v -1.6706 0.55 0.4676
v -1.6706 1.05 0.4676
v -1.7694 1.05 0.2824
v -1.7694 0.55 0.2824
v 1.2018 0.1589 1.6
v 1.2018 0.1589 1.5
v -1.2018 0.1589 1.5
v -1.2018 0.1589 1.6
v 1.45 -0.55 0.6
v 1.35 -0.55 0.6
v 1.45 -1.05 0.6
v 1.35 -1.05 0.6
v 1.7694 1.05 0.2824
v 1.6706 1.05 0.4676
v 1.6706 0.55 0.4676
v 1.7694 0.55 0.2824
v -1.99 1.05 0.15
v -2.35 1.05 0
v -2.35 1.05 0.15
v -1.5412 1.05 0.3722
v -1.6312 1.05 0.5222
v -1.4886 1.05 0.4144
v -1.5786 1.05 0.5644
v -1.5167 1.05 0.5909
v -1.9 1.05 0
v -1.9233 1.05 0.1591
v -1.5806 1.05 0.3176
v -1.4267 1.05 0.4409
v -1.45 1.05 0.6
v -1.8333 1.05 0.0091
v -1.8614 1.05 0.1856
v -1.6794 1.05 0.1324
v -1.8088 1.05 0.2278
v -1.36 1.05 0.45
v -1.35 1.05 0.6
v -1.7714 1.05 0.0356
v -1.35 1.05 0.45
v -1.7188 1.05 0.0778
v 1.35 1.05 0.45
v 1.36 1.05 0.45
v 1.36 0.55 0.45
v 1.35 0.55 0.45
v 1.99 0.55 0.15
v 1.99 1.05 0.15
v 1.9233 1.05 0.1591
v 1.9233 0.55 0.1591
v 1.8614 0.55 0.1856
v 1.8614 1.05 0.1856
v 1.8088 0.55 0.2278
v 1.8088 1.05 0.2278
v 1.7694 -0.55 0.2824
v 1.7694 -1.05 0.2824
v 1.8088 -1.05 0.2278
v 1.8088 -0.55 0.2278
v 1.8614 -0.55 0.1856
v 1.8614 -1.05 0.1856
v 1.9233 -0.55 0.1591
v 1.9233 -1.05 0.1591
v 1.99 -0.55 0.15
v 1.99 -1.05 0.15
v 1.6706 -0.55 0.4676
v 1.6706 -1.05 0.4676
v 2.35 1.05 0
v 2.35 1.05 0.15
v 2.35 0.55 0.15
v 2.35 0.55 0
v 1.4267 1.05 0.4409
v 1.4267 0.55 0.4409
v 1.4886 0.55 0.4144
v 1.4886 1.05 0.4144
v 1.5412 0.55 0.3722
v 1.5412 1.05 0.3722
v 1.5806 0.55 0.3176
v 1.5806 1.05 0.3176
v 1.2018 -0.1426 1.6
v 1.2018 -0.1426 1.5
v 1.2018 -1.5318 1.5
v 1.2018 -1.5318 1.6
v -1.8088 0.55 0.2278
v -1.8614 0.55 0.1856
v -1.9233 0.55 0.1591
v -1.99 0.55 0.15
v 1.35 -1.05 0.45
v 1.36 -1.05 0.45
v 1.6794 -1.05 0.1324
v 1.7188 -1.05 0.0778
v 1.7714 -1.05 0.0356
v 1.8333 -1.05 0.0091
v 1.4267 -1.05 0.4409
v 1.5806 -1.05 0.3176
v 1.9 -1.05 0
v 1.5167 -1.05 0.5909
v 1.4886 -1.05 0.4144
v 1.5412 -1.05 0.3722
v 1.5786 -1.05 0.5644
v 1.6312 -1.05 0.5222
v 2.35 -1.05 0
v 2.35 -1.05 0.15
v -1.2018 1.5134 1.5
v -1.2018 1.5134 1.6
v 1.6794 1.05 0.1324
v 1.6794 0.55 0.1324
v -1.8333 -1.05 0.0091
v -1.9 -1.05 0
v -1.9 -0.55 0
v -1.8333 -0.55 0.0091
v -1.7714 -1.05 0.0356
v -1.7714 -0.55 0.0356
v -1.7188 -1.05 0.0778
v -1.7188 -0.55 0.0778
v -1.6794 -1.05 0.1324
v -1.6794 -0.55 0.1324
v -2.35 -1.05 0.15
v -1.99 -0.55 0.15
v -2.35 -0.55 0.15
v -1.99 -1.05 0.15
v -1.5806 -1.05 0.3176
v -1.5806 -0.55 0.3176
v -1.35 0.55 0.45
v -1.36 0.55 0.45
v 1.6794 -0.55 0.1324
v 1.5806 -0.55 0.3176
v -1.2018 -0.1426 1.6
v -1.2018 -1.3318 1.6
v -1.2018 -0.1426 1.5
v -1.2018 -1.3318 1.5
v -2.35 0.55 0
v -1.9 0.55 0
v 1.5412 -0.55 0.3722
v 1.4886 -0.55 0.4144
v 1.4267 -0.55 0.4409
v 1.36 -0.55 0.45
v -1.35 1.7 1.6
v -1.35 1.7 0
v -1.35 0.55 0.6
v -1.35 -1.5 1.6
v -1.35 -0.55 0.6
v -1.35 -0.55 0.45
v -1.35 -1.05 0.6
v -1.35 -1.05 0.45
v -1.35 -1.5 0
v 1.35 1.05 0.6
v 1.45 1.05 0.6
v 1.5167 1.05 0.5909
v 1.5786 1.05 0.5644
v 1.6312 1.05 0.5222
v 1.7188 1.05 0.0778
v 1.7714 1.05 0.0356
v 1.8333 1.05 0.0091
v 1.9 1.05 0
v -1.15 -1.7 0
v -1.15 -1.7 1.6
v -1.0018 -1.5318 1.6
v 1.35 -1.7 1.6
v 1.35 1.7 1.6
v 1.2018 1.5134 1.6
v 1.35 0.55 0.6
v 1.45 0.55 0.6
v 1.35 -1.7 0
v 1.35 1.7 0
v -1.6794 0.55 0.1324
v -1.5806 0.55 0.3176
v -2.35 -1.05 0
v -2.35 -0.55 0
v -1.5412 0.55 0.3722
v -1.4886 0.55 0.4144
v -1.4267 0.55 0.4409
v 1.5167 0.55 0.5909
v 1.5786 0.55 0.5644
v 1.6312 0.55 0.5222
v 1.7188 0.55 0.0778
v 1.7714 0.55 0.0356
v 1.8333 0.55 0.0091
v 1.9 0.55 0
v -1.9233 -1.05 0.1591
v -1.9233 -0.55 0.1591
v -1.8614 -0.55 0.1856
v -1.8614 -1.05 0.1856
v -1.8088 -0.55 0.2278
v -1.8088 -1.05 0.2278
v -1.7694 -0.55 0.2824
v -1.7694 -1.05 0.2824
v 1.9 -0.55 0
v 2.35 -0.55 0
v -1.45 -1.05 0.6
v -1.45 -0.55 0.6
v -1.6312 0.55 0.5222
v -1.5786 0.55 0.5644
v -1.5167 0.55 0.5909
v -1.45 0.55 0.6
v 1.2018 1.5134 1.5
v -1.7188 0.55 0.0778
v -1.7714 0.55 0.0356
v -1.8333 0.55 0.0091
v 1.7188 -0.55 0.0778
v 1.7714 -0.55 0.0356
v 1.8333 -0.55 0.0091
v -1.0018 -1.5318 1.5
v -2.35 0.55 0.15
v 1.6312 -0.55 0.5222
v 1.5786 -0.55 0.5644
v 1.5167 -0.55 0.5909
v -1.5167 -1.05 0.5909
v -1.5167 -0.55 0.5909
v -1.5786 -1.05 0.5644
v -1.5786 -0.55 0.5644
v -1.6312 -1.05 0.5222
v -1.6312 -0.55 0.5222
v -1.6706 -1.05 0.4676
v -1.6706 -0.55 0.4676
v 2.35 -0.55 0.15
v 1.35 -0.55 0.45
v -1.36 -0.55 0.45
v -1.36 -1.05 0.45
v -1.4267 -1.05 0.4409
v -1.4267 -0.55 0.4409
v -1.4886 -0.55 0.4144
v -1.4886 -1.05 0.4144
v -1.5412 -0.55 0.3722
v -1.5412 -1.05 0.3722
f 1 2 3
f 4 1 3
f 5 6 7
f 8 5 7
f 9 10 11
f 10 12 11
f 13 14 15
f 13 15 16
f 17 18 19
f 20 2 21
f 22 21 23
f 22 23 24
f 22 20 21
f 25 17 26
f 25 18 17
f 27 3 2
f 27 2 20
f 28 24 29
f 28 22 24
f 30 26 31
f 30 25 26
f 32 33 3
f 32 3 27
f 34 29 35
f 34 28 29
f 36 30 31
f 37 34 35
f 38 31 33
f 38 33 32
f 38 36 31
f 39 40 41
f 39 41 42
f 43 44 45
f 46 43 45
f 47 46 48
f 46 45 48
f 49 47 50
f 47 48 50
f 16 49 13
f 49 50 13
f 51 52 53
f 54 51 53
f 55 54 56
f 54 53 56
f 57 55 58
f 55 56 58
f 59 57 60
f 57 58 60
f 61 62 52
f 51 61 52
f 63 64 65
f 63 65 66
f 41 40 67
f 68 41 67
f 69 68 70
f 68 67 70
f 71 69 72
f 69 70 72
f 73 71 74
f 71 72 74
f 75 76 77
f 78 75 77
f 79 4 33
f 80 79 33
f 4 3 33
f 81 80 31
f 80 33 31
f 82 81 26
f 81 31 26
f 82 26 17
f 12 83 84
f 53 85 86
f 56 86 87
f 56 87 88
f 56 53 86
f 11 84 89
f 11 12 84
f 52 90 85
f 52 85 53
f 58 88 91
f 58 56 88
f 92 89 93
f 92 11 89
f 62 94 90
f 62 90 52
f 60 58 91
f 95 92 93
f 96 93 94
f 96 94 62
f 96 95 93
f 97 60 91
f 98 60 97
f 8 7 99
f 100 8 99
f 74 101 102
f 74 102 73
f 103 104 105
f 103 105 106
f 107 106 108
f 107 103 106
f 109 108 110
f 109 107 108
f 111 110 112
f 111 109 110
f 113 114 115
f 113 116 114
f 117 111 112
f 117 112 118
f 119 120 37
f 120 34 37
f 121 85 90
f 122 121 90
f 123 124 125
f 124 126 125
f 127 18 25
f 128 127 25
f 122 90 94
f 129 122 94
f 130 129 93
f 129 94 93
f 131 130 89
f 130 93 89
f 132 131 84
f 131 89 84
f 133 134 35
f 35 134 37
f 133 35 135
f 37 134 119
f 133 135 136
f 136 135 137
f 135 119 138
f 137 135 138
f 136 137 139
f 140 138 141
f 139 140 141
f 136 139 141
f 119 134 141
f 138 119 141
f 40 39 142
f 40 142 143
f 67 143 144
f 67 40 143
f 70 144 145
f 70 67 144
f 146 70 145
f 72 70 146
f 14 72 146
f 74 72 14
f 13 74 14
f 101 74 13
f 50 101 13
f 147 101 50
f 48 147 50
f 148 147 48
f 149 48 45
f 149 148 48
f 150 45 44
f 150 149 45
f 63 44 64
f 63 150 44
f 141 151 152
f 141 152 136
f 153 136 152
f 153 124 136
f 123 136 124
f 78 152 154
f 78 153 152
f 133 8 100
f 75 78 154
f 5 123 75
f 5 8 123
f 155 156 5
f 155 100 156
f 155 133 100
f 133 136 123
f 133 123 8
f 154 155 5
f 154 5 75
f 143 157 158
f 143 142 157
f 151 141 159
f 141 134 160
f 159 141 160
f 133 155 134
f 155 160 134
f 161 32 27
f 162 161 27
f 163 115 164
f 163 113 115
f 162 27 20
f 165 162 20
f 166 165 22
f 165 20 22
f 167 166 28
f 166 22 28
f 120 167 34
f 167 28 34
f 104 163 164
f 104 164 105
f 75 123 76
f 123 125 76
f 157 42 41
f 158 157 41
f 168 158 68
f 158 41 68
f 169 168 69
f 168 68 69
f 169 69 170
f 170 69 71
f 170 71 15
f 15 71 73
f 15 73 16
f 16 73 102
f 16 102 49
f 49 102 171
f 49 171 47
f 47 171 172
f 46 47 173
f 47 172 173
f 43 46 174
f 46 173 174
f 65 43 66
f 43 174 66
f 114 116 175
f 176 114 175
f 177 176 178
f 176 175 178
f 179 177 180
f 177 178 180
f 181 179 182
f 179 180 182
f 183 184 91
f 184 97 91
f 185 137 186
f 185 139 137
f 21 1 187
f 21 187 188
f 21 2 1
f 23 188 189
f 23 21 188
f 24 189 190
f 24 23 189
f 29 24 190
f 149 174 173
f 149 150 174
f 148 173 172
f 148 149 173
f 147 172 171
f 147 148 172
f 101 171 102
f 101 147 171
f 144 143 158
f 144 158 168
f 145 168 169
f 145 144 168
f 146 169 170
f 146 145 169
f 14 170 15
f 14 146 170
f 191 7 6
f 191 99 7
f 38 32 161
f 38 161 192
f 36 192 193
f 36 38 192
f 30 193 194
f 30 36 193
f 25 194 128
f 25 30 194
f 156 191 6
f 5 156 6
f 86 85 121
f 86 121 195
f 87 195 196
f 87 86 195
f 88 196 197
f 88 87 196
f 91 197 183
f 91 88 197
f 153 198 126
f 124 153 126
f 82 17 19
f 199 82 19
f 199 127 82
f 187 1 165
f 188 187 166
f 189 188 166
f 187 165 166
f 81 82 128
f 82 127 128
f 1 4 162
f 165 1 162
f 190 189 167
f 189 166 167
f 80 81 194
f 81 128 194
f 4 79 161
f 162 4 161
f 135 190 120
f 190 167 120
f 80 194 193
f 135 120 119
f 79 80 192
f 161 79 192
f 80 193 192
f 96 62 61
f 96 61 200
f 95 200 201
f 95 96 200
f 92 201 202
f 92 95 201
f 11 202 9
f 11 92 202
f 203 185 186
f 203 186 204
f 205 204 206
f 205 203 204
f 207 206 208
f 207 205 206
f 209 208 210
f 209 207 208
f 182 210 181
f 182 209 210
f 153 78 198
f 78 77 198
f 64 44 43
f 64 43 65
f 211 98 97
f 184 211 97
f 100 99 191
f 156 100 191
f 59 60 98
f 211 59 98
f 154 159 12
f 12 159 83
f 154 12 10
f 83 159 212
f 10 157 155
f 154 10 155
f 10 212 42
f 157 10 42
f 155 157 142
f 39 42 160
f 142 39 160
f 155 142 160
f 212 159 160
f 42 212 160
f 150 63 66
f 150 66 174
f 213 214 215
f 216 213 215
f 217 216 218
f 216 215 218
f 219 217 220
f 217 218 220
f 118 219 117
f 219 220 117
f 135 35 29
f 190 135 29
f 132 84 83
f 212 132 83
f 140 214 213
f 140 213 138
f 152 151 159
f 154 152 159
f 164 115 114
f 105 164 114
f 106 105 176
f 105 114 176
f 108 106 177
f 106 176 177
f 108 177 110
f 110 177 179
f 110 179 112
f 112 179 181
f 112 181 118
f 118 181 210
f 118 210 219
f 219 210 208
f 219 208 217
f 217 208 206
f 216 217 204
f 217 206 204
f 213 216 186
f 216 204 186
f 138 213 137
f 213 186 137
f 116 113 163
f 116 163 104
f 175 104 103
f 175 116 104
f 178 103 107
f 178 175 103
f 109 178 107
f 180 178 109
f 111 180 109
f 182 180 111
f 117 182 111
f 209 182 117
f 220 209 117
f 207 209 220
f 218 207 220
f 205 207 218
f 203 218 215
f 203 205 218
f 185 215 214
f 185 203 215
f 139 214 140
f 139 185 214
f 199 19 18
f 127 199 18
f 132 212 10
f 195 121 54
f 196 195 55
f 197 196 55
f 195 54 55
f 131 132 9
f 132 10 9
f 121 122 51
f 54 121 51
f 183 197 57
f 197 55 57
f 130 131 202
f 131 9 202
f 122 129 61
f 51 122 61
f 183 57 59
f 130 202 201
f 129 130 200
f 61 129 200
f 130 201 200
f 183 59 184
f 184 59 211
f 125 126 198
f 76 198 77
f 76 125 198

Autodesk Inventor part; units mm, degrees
ref_plane "YZ Plane" through (0, 0, 0) normal (1, 0, 0) x (0, 1, 0)
ref_plane "XZ Plane" through (0, 0, 0) normal (0, 1, 0) x (-1, 0, 0)
ref_plane "XY Plane" through (0, 0, 0) normal (0, 0, 1) x (1, 0, 0)
sketch "Эскиз1" plane through (0, 0, 0) normal (0, 0, 1) x (1, 0, 0)
  line L0 (-1.15, -1.7) -> (1.35, -1.7)
  line L1 (1.35, -1.7) -> (1.35, 1.7)
  line L2 (1.35, 1.7) -> (-1.35, 1.7)
  line L3 (-1.35, 1.7) -> (-1.35, -1.5)
  line L4 (-1.35, -1.7) -> (1.35, 1.7) construction
  line L5 (1.35, -1.7) -> (-1.35, 1.7) construction
  line L6 (1.2018, 0.1589) -> (-1.2018, 0.1589)
  line L7 (-1.2018, 0.1589) -> (-1.2018, 1.5134)
  line L8 (-1.2018, 1.5134) -> (1.2018, 1.5134)
  line L9 (1.2018, 1.5134) -> (1.2018, 0.1589)
  line L10 (1.2018, 0.1589) -> (-1.2018, 1.5134) construction
  line L11 (-1.2018, 0.1589) -> (1.2018, 1.5134) construction
  line L12 (-1.15, -1.7) -> (-1.35, -1.5)
  line L13 (1.2018, -1.5318) -> (-1.0018, -1.5318)
  line L14 (-1.2018, -1.3318) -> (-1.2018, -0.1426)
  line L15 (-1.2018, -0.1426) -> (1.2018, -0.1426)
  line L16 (1.2018, -0.1426) -> (1.2018, -1.5318)
  line L17 (1.2018, -1.5318) -> (-1.2018, -0.1426) construction
  line L18 (-1.2018, -1.5318) -> (1.2018, -0.1426) construction
  line L19 (-1.0018, -1.5318) -> (-1.2018, -1.3318)
  point P0 (0, 0)
  point P1 (0, 0.8361)
  point P2 (0, -0.8372)
  dimension "d0" = 2.7
  dimension "d1" = 3.4
  dimension "d2" = 0.2
  dimension "d3" = 0.2
  dimension "d4" = 0.2
  dimension "d5" = 0.2
extrude "Выдавливание1" add sketch "Эскиз1" along normal blind 1.6
extrude "Выдавливание2" add sketch "Эскиз1" along normal blind 1.5 contours L6 L7 L8 L9 | L13 L19 L14 L15 L16
sketch "Эскиз2" plane through (-1.35, 1.7, 0) normal (0, 1, 0) x (1, 0, 0)
  line L0 (0, 0) -> (0, -1.6) projected
  line L1 (0, -0.6) -> (-0.1, -0.6)
  line L2 (-0.3206, -0.4676) -> (-0.4194, -0.2824)
  line L3 (-0.64, -0.15) -> (-1, -0.15)
  line L4 (-1, -0.15) -> (-1, 0)
  line L5 (-1, 0) -> (-0.55, 0)
  line L6 (-0.3294, -0.1324) -> (-0.2306, -0.3176)
  line L7 (-0.01, -0.45) -> (0, -0.45)
  line L8 (0, 0) -> (2.7, 0) projected
  arc A0 (-0.4194, -0.2824) -> (-0.64, -0.15) centre (-0.64, -0.4) ccw
  arc A1 (-0.3206, -0.4676) -> (-0.1, -0.6) centre (-0.1, -0.35) ccw
  arc A2 (-0.2306, -0.3176) -> (-0.01, -0.45) centre (-0.01, -0.2) ccw
  arc A3 (-0.3294, -0.1324) -> (-0.55, 0) centre (-0.55, -0.25) ccw
  line L9 (1.35, 0) -> (1.35, -1.6) construction
  line L10 (2.7, -0.6) -> (2.8, -0.6)
  line L11 (3.0206, -0.4676) -> (3.1194, -0.2824)
  line L12 (3.34, -0.15) -> (3.7, -0.15)
  line L13 (3.7, -0.15) -> (3.7, 0)
  line L14 (3.7, 0) -> (3.25, 0)
  line L15 (3.0294, -0.1324) -> (2.9306, -0.3176)
  line L16 (2.71, -0.45) -> (2.7, -0.45)
  arc A4 (3.34, -0.15) -> (3.1194, -0.2824) centre (3.34, -0.4) ccw
  arc A5 (2.8, -0.6) -> (3.0206, -0.4676) centre (2.8, -0.35) ccw
  arc A6 (2.71, -0.45) -> (2.9306, -0.3176) centre (2.71, -0.2) ccw
  arc A7 (3.25, 0) -> (3.0294, -0.1324) centre (3.25, -0.25) ccw
  line L17 (0, -0.6) -> (0, -0.45)
  line L18 (2.7, -0.6) -> (2.7, -0.45)
  line L19 (2.7, 0) -> (2.7, -1.6) projected
  point P0 (-0.25, -0.6)
  point P1 (-0.4, 0)
  point P2 (2.95, -0.6)
  point P3 (3.1, 0)
  dimension "d10" = 0.25
  dimension "d11" = 0.15
  dimension "d12" = 0.15
  dimension "d13" = 0.15
  dimension "d14" = 0.6
  dimension "d15" = 1
  dimension "d16" = 0.6
  dimension "d17" = 0.25
extrude "Выдавливание3" add sketch "Эскиз2" against normal blind 1.15
extrude "Выдавливание4" cut sketch "Эскиз2" against normal blind 0.65
sketch "Эскиз3" plane through (-1.15, -1.7, 0) normal (0, -1, 0) x (1, 0, 0)
  line L0 (-1.2, 0) -> (-0.75, 0)
  line L1 (3.5, 0) -> (3.05, 0)
  line L2 (-0.2, 0) -> (-0.2, 1.6) projected
  line L3 (2.5, 0) -> (2.5, 1.6) projected
  line L4 (2.5, 0) -> (-0.2, 0) construction
  line L5 (-0.2, 0.6) -> (-0.3, 0.6)
  line L6 (-0.5206, 0.4676) -> (-0.6194, 0.2824)
  line L7 (-0.84, 0.15) -> (-1.2, 0.15)
  line L8 (-1.2, 0.15) -> (-1.2, 0)
  line L9 (-0.5294, 0.1324) -> (-0.4306, 0.3176)
  line L10 (-0.21, 0.45) -> (-0.2, 0.45)
  arc A0 (-0.84, 0.15) -> (-0.6194, 0.2824) centre (-0.84, 0.4) ccw
  arc A1 (-0.3, 0.6) -> (-0.5206, 0.4676) centre (-0.3, 0.35) ccw
  arc A2 (-0.21, 0.45) -> (-0.4306, 0.3176) centre (-0.21, 0.2) ccw
  arc A3 (-0.75, 0) -> (-0.5294, 0.1324) centre (-0.75, 0.25) ccw
  line L11 (1.15, 0) -> (1.15, 0.6) construction
  arc A4 (2.7306, 0.3176) -> (2.51, 0.45) centre (2.51, 0.2) ccw
  arc A5 (2.8206, 0.4676) -> (2.6, 0.6) centre (2.6, 0.35) ccw
  line L12 (2.8294, 0.1324) -> (2.7306, 0.3176)
  line L13 (2.8206, 0.4676) -> (2.9194, 0.2824)
  arc A6 (2.8294, 0.1324) -> (3.05, 0) centre (3.05, 0.25) ccw
  arc A7 (2.9194, 0.2824) -> (3.14, 0.15) centre (3.14, 0.4) ccw
  line L14 (3.14, 0.15) -> (3.5, 0.15)
  line L15 (3.5, 0.15) -> (3.5, 0)
  line L16 (2.5, 0.6) -> (2.6, 0.6)
  line L17 (2.51, 0.45) -> (2.5, 0.45)
  line L18 (-0.2, 0.6) -> (-0.2, 0.45)
  line L19 (2.5, 0.6) -> (2.5, 0.45)
  point P0 (-0.6, 0)
  point P1 (2.9, 0)
  point P2 (-0.45, 0.6)
  point P3 (2.75, 0.6)
  dimension "d28" = 0.6
extrude "Выдавливание5" add sketch "Эскиз3" against normal blind 1.15
extrude "Выдавливание6" cut sketch "Эскиз3" against normal blind 0.65
equation "\"d3\" = d2"
equation "\"d5\" = d4"
properties part number "QRE1113"
